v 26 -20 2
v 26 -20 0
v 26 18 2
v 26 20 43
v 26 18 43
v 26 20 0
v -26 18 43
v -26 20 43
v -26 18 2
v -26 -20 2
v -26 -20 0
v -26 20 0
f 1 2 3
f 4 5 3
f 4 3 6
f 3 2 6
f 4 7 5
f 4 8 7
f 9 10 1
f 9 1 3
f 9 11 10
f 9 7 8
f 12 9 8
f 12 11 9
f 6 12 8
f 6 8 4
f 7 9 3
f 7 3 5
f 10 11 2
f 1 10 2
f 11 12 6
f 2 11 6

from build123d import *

# Parameters (mm, degrees)
ESQUISSE1_W             = 52
ESQUISSE1_H             = 40
BOSS_EXTRU_1_DEPTH      = 43
ESQUISSE2_W             = 48.222048012
ESQUISSE2_H             = 36
ENL_V_MAT_EXTRU_1_DEPTH = 50
ESQUISSE3_W             = 72.686110251
ESQUISSE3_H             = 50.534375484
ENL_V_MAT_EXTRU_2_DEPTH = 38


with BuildPart() as part:
    # Esquisse1 → Boss.-Extru.1 (new body)
    with BuildSketch(Plane.XY):
        Rectangle(ESQUISSE1_W, ESQUISSE1_H)
    extrude(amount=BOSS_EXTRU_1_DEPTH)

    # Esquisse2 → Enlèv. mat.-Extru.1 (cut)
    with BuildSketch(Plane.ZY.offset(26)):
        with Locations((26.111024006, 0)):
            Rectangle(ESQUISSE2_W, ESQUISSE2_H)
    extrude(amount=-ENL_V_MAT_EXTRU_1_DEPTH, mode=Mode.SUBTRACT)

    # Esquisse3 → Enlèv. mat.-Extru.2 (cut)
    with BuildSketch(Plane.XZ.offset(20)):
        with Locations((1.657877156, 27.267187742)):
            Rectangle(ESQUISSE3_W, ESQUISSE3_H)
    extrude(amount=-ENL_V_MAT_EXTRU_2_DEPTH, mode=Mode.SUBTRACT)


solid = part.part
